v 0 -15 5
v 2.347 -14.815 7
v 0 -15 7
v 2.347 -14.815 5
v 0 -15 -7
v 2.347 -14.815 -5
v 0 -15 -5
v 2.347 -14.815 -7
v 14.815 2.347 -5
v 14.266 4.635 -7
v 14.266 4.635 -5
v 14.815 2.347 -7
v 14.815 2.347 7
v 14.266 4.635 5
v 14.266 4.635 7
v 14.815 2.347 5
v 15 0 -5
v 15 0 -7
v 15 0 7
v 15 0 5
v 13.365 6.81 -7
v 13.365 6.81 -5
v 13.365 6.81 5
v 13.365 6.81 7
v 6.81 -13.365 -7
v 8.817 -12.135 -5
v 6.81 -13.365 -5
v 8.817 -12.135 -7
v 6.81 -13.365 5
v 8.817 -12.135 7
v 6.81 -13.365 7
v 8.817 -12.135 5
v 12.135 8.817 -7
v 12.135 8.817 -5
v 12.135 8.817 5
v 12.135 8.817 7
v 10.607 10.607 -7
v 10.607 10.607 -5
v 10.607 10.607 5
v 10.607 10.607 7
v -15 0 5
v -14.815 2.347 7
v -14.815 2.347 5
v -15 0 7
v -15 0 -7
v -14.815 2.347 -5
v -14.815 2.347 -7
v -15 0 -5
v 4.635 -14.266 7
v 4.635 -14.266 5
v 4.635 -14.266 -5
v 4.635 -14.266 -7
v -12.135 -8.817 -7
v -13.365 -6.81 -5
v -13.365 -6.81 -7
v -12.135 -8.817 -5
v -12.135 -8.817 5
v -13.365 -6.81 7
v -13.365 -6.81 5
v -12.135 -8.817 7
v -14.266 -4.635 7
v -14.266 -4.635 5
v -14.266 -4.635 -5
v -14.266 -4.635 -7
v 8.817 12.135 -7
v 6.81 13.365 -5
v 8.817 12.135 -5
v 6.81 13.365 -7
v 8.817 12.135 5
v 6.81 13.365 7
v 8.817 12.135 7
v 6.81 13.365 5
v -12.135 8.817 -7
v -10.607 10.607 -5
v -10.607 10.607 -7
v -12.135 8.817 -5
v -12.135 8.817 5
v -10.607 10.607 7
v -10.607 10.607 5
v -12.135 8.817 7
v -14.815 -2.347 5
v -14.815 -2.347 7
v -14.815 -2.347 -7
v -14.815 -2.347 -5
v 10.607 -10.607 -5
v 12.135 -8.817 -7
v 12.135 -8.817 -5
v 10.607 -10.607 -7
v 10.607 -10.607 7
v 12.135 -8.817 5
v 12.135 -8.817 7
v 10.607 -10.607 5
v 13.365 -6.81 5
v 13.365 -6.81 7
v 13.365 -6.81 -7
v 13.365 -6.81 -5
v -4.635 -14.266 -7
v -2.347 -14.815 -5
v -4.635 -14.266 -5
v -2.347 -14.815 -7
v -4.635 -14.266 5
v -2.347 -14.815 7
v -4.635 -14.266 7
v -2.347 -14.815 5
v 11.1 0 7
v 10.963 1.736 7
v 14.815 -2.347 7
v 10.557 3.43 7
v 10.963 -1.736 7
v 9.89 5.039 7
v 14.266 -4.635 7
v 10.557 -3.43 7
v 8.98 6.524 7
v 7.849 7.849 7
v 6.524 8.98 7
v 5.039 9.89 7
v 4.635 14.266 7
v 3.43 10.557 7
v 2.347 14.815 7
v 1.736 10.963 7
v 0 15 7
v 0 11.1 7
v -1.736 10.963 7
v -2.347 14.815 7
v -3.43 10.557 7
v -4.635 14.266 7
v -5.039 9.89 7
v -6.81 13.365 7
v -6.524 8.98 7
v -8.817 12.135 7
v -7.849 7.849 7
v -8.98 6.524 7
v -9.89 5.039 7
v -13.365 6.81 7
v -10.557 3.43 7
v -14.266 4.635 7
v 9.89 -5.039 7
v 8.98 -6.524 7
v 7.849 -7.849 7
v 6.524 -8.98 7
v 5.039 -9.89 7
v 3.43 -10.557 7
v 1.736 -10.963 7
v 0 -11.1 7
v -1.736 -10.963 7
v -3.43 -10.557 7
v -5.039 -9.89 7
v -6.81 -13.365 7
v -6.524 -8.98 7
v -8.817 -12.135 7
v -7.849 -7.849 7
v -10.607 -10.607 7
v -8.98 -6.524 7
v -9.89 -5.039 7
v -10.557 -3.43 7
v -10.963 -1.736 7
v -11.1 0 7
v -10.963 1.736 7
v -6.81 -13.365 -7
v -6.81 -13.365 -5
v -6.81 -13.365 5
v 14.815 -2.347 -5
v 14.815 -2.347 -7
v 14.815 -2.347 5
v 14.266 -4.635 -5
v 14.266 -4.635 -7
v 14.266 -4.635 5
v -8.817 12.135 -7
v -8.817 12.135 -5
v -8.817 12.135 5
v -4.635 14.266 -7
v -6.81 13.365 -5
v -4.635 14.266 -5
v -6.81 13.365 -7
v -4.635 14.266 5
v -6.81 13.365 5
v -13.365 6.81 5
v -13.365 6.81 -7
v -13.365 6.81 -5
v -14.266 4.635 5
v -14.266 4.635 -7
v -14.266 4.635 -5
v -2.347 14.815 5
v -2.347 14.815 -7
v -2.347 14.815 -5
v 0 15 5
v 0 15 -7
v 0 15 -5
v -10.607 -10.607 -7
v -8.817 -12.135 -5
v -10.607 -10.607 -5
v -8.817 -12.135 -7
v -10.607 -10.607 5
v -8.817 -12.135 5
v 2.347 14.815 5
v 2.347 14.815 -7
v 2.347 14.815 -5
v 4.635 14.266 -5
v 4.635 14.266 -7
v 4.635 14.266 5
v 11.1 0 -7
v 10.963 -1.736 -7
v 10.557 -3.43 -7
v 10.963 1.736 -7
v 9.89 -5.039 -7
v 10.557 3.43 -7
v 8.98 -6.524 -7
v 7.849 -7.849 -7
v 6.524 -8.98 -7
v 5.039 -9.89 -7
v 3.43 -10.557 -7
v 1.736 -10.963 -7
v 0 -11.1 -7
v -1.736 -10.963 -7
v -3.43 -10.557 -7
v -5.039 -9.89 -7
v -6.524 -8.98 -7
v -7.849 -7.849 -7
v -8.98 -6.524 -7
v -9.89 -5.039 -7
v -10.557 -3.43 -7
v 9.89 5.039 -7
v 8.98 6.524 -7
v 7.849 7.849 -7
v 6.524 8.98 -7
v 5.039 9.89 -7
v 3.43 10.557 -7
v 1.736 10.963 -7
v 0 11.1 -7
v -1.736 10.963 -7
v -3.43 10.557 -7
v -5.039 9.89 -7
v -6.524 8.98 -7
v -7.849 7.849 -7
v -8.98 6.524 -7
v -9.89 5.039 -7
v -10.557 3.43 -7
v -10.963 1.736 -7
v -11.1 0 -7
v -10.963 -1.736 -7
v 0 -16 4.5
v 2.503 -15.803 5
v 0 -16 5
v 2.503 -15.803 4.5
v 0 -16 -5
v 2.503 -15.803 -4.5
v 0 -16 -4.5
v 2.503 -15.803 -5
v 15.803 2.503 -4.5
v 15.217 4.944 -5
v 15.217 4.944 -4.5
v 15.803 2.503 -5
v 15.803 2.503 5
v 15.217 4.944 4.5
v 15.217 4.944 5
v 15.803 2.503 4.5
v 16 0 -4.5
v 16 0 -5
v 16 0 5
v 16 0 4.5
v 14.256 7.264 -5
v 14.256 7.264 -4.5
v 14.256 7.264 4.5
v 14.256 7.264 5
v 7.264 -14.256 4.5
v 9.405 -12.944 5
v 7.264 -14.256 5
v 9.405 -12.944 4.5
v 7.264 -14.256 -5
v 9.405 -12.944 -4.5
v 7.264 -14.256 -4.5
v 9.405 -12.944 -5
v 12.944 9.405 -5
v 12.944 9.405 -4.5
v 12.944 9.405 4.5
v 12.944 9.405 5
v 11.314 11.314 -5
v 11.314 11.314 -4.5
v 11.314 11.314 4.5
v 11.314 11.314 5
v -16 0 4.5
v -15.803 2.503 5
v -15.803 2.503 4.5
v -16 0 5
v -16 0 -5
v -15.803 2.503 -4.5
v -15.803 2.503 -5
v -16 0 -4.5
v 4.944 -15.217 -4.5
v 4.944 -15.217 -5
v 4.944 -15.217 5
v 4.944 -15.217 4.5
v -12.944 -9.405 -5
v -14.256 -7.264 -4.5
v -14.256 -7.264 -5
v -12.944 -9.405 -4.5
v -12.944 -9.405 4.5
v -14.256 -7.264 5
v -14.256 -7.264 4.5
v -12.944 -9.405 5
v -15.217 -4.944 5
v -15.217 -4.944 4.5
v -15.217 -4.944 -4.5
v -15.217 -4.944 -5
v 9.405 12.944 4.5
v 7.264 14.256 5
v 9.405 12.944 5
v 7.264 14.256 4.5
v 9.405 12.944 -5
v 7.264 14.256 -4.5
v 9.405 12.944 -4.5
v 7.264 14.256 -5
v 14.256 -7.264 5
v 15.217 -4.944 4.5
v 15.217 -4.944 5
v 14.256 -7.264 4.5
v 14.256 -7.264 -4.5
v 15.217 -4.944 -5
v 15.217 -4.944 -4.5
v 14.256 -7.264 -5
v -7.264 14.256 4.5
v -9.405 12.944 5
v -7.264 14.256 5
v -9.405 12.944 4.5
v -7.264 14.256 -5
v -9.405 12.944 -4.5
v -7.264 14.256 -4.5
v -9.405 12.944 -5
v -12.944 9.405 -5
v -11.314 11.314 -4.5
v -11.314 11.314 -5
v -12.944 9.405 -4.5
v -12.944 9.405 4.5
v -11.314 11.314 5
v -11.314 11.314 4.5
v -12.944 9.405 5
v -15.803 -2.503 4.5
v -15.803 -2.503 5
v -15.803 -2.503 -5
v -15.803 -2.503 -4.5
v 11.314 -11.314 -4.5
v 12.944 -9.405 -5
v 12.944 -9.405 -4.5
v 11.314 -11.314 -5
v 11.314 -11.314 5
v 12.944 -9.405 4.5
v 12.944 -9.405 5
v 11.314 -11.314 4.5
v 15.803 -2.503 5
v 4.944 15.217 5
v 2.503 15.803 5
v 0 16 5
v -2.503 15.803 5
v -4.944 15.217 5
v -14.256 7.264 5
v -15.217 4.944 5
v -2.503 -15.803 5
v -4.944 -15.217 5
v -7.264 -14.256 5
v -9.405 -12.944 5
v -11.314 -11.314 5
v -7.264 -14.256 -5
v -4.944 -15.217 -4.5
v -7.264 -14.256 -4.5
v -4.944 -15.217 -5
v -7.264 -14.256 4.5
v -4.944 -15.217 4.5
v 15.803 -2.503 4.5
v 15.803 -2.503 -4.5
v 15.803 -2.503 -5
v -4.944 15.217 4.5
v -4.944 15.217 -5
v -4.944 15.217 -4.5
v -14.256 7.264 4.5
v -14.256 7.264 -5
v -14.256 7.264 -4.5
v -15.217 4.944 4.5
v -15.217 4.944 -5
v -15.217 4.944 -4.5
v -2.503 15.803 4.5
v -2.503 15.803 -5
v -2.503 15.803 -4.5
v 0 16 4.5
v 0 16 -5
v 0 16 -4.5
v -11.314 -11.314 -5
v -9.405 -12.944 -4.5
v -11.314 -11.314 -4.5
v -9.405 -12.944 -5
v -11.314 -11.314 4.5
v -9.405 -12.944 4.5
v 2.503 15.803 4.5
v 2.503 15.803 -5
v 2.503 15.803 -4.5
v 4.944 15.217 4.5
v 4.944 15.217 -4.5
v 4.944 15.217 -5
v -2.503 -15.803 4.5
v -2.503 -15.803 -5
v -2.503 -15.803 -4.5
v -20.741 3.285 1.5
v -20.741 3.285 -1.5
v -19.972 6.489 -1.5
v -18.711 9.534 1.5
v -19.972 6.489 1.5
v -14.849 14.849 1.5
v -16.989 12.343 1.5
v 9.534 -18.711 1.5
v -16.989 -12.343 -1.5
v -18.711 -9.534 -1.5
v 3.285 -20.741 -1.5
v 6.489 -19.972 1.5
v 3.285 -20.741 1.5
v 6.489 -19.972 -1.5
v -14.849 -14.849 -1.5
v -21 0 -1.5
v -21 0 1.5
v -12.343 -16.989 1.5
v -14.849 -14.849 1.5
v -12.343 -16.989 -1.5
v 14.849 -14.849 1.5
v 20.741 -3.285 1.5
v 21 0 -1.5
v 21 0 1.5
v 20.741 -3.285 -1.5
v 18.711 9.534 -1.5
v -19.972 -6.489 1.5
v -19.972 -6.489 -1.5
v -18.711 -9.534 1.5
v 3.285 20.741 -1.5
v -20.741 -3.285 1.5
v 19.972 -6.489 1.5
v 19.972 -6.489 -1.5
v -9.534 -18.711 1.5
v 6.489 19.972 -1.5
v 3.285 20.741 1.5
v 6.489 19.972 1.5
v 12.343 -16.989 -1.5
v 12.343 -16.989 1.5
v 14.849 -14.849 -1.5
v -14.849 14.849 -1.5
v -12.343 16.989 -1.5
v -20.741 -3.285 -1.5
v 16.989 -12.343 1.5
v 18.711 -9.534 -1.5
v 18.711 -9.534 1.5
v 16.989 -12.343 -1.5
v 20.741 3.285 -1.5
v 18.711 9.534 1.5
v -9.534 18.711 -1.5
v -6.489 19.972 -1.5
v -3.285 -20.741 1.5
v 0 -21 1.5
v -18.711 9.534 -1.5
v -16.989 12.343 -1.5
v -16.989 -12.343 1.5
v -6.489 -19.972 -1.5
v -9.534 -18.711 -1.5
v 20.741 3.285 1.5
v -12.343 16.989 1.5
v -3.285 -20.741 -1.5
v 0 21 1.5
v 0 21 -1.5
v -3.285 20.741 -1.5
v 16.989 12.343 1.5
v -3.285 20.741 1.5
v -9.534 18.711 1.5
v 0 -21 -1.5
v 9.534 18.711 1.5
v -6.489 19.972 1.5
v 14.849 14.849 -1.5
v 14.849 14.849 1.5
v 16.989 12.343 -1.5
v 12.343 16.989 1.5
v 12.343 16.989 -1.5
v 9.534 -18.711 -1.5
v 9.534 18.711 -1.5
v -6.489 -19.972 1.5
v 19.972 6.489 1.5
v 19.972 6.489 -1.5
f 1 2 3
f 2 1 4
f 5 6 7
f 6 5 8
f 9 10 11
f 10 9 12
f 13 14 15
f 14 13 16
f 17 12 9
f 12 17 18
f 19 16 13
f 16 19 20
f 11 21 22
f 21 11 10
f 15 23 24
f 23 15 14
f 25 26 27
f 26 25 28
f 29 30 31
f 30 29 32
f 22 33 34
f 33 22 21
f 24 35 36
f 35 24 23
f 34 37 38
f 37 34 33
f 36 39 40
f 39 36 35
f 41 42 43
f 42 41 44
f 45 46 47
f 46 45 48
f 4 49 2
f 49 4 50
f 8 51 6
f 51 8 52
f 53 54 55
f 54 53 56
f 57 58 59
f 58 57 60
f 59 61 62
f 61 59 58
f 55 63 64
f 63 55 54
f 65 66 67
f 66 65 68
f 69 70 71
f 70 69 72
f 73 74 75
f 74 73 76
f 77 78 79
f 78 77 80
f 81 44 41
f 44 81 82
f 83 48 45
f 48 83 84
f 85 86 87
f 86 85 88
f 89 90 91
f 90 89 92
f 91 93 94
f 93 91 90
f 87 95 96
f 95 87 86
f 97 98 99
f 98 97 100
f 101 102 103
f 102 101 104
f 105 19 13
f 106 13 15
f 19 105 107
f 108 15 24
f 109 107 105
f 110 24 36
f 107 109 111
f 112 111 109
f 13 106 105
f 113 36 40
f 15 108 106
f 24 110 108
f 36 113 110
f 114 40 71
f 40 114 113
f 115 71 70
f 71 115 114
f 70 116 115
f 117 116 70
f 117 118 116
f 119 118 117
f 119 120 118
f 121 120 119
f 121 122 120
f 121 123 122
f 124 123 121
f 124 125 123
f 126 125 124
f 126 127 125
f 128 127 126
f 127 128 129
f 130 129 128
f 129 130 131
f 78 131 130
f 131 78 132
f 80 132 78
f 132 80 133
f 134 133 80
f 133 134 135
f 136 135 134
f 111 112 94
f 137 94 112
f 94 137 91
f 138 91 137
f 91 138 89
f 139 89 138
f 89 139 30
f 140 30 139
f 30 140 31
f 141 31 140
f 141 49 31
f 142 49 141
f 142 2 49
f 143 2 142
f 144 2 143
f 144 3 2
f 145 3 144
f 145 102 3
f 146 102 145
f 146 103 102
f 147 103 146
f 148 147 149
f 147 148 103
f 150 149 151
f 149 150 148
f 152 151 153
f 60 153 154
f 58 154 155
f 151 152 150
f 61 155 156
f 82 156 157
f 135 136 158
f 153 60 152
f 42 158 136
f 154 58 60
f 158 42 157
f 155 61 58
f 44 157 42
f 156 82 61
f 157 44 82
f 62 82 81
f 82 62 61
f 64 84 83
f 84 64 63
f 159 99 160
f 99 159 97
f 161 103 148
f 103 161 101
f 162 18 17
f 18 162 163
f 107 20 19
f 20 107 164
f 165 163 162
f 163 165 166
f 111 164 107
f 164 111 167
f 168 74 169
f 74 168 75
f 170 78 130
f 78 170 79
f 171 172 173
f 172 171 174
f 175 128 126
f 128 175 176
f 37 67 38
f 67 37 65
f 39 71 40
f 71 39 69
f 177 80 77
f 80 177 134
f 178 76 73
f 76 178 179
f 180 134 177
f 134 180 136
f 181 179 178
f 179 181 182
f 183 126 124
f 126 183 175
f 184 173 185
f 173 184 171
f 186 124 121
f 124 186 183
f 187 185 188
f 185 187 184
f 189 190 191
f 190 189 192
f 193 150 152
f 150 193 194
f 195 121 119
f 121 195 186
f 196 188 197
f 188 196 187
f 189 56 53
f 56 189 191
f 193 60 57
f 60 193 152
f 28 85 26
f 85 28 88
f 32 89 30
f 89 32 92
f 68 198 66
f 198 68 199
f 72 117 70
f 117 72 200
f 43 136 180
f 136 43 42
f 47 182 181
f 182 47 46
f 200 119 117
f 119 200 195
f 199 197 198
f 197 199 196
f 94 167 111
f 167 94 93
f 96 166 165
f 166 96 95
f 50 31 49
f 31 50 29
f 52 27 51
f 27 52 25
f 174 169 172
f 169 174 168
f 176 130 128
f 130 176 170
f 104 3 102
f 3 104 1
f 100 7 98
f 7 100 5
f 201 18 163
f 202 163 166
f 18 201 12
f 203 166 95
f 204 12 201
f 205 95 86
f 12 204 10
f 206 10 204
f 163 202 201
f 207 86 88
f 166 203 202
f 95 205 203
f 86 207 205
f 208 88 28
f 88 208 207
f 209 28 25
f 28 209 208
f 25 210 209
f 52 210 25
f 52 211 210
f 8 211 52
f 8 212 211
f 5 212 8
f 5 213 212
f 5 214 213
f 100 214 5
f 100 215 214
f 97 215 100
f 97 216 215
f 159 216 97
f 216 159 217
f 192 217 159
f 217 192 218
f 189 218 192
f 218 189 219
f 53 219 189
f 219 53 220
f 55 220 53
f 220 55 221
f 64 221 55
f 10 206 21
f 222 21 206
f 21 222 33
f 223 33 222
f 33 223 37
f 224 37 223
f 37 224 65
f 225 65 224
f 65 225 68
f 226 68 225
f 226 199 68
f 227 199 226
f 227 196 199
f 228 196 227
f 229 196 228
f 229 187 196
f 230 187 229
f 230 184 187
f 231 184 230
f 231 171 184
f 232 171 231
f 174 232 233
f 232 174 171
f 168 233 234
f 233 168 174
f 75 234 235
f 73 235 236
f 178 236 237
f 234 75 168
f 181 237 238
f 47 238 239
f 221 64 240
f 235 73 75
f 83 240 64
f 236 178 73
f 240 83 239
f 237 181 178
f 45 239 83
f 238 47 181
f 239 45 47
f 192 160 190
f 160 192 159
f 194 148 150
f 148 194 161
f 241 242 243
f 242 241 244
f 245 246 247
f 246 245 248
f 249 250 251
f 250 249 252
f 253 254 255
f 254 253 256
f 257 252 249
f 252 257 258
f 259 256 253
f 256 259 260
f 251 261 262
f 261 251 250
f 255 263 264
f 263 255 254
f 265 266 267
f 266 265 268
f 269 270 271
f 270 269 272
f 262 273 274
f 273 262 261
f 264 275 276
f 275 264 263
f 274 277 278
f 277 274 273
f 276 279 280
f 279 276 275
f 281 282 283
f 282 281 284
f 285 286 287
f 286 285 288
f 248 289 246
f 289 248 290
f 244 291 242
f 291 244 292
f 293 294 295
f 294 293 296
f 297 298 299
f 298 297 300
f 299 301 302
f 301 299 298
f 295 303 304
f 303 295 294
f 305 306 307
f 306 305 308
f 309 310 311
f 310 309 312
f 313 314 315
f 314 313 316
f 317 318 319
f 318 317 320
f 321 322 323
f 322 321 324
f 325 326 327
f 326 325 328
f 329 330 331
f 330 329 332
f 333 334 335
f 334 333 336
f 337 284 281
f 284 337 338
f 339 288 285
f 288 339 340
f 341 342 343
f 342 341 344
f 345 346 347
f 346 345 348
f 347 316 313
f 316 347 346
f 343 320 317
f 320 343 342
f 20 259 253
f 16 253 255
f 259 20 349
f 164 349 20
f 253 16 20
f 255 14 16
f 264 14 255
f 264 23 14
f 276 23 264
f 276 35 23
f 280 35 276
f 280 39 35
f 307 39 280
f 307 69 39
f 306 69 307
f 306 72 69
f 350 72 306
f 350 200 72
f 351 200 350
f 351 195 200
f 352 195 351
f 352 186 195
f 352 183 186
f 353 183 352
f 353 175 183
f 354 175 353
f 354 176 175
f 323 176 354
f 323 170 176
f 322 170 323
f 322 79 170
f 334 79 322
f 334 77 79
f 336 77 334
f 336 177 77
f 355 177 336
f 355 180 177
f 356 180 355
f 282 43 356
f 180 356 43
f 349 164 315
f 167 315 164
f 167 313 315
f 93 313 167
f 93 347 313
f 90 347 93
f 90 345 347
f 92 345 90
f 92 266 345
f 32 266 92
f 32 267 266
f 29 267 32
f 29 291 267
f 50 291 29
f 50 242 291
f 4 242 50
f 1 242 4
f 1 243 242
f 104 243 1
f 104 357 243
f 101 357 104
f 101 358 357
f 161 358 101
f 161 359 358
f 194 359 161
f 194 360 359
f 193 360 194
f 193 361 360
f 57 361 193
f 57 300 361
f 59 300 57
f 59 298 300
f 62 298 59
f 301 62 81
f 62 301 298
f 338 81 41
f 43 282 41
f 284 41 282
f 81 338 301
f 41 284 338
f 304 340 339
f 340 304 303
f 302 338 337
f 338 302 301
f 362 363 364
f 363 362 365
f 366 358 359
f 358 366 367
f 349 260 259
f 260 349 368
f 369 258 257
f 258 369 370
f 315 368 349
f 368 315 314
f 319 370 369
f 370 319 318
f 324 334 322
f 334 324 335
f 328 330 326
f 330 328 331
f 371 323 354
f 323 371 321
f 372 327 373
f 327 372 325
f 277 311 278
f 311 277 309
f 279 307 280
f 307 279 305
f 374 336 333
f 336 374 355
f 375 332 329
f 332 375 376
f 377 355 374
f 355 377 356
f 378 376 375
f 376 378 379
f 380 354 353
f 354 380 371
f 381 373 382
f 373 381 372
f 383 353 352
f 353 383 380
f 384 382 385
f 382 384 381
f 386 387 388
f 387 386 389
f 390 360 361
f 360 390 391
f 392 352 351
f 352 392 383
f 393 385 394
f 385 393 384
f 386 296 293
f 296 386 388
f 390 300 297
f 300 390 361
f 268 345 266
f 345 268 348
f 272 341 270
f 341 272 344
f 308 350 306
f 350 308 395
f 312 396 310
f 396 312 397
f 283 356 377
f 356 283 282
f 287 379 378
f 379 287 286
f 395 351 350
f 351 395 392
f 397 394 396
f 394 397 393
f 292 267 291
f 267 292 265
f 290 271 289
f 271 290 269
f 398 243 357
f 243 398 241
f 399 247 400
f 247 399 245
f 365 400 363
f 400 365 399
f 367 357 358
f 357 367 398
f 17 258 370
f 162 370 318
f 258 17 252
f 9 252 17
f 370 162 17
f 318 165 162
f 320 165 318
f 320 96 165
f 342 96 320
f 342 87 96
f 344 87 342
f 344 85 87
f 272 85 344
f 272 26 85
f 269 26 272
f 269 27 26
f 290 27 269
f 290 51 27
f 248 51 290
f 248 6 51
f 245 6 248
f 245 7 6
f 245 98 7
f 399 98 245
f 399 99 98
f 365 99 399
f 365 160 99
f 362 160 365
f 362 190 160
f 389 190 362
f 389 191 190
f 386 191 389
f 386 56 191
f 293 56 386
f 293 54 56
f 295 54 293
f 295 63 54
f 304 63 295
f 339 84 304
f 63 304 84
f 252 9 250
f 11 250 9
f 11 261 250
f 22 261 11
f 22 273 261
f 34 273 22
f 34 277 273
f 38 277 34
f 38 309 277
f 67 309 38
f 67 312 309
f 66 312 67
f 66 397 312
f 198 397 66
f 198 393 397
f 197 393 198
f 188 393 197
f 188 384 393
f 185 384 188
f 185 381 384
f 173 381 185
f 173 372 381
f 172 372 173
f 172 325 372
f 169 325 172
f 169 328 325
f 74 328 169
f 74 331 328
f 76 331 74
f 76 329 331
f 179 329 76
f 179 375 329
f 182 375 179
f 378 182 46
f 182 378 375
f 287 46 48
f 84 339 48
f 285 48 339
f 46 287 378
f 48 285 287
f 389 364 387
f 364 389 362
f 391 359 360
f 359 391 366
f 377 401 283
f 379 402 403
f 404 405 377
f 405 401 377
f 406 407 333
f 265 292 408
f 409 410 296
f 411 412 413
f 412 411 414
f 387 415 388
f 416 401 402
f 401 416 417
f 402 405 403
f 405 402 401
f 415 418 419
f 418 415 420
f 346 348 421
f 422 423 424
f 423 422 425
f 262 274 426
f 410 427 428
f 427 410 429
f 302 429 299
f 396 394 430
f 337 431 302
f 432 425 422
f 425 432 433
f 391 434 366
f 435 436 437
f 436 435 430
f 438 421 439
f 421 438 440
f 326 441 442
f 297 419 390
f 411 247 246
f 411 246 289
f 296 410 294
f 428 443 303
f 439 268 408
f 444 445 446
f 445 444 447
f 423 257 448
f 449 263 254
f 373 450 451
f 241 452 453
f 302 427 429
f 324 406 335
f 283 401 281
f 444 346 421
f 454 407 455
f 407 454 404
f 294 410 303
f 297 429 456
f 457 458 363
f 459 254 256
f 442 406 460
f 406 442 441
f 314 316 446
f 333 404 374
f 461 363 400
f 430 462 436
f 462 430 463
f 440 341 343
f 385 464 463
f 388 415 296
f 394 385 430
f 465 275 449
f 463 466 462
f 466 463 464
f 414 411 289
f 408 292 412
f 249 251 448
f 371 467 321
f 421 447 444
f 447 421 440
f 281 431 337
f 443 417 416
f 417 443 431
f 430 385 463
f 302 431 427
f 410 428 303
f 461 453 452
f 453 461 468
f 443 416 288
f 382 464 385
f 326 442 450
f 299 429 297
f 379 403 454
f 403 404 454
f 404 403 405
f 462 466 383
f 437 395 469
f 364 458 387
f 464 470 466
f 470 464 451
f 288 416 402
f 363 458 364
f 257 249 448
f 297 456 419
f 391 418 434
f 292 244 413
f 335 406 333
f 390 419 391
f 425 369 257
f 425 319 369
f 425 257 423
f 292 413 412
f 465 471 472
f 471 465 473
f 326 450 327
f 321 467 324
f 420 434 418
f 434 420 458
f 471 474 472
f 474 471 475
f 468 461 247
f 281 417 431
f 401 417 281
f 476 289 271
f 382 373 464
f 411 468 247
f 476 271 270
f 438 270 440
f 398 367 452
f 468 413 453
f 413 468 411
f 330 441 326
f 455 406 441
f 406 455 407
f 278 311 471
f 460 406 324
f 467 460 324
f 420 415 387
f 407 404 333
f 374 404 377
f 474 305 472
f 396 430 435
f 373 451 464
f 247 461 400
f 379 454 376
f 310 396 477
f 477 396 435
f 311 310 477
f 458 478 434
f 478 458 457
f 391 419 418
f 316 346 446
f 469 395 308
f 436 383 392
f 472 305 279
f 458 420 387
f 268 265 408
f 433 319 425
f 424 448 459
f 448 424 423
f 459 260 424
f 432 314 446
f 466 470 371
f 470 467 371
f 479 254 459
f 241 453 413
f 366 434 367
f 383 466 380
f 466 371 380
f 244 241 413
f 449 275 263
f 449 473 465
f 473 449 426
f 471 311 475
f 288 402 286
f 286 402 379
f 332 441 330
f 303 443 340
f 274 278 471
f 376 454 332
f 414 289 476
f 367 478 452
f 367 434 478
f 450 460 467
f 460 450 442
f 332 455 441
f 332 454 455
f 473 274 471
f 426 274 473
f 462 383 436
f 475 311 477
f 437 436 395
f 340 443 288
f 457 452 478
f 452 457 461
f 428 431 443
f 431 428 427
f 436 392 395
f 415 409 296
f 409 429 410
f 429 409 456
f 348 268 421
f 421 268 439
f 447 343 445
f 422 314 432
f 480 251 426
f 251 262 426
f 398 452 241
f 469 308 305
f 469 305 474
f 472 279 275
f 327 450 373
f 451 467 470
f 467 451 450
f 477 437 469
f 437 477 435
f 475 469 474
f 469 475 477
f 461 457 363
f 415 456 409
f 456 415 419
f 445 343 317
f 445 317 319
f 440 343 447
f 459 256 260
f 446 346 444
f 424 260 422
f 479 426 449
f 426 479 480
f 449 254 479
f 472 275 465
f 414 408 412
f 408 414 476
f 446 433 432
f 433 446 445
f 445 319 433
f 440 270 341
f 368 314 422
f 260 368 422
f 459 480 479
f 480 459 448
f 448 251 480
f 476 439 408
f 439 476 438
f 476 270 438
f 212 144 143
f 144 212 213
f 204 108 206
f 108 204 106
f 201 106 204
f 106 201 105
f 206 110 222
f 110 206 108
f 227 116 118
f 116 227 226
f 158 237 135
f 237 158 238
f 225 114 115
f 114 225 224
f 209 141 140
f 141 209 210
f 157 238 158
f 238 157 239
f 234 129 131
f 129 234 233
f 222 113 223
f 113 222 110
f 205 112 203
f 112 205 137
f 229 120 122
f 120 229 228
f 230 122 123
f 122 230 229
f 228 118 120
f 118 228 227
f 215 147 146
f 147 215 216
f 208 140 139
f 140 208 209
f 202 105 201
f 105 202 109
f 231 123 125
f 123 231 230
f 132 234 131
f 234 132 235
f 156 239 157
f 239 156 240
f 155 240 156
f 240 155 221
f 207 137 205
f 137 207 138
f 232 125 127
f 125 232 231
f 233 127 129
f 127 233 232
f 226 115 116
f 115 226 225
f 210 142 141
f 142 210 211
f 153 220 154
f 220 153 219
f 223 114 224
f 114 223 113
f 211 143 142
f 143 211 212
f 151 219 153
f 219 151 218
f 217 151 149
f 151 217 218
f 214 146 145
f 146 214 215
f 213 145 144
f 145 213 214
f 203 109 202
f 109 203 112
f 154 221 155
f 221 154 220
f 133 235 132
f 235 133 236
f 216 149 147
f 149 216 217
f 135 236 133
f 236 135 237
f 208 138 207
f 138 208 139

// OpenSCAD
$fn=40;

//608ZZ dimensions: outerDiameter = 22, width = 7
//603ZZ dimensions: outerDiameter = 9, width = 5

numberOfBearings=2;
outerBearingDiameter = 22;
bearingWidth = 7;
extrusionGapWidth = 6;

module vRoller() {

	difference() {
		union() {
			cylinder(r = outerBearingDiameter / 2 + 4, h = bearingWidth * numberOfBearings, center = true);
			cylinder(r = outerBearingDiameter / 2 + 5, h = bearingWidth * numberOfBearings - 4, center = true);
			hull() {
				cylinder(r = outerBearingDiameter / 2 + 5, h = extrusionGapWidth + 3, center = true);
				cylinder(r = outerBearingDiameter / 2 + 10, h = extrusionGapWidth - 3, center = true);
			}
			
		}
		//Center hole
		cylinder(r = outerBearingDiameter / 2 + .1, h = bearingWidth * numberOfBearings * 2, center = true);
	}
}

vRoller();
